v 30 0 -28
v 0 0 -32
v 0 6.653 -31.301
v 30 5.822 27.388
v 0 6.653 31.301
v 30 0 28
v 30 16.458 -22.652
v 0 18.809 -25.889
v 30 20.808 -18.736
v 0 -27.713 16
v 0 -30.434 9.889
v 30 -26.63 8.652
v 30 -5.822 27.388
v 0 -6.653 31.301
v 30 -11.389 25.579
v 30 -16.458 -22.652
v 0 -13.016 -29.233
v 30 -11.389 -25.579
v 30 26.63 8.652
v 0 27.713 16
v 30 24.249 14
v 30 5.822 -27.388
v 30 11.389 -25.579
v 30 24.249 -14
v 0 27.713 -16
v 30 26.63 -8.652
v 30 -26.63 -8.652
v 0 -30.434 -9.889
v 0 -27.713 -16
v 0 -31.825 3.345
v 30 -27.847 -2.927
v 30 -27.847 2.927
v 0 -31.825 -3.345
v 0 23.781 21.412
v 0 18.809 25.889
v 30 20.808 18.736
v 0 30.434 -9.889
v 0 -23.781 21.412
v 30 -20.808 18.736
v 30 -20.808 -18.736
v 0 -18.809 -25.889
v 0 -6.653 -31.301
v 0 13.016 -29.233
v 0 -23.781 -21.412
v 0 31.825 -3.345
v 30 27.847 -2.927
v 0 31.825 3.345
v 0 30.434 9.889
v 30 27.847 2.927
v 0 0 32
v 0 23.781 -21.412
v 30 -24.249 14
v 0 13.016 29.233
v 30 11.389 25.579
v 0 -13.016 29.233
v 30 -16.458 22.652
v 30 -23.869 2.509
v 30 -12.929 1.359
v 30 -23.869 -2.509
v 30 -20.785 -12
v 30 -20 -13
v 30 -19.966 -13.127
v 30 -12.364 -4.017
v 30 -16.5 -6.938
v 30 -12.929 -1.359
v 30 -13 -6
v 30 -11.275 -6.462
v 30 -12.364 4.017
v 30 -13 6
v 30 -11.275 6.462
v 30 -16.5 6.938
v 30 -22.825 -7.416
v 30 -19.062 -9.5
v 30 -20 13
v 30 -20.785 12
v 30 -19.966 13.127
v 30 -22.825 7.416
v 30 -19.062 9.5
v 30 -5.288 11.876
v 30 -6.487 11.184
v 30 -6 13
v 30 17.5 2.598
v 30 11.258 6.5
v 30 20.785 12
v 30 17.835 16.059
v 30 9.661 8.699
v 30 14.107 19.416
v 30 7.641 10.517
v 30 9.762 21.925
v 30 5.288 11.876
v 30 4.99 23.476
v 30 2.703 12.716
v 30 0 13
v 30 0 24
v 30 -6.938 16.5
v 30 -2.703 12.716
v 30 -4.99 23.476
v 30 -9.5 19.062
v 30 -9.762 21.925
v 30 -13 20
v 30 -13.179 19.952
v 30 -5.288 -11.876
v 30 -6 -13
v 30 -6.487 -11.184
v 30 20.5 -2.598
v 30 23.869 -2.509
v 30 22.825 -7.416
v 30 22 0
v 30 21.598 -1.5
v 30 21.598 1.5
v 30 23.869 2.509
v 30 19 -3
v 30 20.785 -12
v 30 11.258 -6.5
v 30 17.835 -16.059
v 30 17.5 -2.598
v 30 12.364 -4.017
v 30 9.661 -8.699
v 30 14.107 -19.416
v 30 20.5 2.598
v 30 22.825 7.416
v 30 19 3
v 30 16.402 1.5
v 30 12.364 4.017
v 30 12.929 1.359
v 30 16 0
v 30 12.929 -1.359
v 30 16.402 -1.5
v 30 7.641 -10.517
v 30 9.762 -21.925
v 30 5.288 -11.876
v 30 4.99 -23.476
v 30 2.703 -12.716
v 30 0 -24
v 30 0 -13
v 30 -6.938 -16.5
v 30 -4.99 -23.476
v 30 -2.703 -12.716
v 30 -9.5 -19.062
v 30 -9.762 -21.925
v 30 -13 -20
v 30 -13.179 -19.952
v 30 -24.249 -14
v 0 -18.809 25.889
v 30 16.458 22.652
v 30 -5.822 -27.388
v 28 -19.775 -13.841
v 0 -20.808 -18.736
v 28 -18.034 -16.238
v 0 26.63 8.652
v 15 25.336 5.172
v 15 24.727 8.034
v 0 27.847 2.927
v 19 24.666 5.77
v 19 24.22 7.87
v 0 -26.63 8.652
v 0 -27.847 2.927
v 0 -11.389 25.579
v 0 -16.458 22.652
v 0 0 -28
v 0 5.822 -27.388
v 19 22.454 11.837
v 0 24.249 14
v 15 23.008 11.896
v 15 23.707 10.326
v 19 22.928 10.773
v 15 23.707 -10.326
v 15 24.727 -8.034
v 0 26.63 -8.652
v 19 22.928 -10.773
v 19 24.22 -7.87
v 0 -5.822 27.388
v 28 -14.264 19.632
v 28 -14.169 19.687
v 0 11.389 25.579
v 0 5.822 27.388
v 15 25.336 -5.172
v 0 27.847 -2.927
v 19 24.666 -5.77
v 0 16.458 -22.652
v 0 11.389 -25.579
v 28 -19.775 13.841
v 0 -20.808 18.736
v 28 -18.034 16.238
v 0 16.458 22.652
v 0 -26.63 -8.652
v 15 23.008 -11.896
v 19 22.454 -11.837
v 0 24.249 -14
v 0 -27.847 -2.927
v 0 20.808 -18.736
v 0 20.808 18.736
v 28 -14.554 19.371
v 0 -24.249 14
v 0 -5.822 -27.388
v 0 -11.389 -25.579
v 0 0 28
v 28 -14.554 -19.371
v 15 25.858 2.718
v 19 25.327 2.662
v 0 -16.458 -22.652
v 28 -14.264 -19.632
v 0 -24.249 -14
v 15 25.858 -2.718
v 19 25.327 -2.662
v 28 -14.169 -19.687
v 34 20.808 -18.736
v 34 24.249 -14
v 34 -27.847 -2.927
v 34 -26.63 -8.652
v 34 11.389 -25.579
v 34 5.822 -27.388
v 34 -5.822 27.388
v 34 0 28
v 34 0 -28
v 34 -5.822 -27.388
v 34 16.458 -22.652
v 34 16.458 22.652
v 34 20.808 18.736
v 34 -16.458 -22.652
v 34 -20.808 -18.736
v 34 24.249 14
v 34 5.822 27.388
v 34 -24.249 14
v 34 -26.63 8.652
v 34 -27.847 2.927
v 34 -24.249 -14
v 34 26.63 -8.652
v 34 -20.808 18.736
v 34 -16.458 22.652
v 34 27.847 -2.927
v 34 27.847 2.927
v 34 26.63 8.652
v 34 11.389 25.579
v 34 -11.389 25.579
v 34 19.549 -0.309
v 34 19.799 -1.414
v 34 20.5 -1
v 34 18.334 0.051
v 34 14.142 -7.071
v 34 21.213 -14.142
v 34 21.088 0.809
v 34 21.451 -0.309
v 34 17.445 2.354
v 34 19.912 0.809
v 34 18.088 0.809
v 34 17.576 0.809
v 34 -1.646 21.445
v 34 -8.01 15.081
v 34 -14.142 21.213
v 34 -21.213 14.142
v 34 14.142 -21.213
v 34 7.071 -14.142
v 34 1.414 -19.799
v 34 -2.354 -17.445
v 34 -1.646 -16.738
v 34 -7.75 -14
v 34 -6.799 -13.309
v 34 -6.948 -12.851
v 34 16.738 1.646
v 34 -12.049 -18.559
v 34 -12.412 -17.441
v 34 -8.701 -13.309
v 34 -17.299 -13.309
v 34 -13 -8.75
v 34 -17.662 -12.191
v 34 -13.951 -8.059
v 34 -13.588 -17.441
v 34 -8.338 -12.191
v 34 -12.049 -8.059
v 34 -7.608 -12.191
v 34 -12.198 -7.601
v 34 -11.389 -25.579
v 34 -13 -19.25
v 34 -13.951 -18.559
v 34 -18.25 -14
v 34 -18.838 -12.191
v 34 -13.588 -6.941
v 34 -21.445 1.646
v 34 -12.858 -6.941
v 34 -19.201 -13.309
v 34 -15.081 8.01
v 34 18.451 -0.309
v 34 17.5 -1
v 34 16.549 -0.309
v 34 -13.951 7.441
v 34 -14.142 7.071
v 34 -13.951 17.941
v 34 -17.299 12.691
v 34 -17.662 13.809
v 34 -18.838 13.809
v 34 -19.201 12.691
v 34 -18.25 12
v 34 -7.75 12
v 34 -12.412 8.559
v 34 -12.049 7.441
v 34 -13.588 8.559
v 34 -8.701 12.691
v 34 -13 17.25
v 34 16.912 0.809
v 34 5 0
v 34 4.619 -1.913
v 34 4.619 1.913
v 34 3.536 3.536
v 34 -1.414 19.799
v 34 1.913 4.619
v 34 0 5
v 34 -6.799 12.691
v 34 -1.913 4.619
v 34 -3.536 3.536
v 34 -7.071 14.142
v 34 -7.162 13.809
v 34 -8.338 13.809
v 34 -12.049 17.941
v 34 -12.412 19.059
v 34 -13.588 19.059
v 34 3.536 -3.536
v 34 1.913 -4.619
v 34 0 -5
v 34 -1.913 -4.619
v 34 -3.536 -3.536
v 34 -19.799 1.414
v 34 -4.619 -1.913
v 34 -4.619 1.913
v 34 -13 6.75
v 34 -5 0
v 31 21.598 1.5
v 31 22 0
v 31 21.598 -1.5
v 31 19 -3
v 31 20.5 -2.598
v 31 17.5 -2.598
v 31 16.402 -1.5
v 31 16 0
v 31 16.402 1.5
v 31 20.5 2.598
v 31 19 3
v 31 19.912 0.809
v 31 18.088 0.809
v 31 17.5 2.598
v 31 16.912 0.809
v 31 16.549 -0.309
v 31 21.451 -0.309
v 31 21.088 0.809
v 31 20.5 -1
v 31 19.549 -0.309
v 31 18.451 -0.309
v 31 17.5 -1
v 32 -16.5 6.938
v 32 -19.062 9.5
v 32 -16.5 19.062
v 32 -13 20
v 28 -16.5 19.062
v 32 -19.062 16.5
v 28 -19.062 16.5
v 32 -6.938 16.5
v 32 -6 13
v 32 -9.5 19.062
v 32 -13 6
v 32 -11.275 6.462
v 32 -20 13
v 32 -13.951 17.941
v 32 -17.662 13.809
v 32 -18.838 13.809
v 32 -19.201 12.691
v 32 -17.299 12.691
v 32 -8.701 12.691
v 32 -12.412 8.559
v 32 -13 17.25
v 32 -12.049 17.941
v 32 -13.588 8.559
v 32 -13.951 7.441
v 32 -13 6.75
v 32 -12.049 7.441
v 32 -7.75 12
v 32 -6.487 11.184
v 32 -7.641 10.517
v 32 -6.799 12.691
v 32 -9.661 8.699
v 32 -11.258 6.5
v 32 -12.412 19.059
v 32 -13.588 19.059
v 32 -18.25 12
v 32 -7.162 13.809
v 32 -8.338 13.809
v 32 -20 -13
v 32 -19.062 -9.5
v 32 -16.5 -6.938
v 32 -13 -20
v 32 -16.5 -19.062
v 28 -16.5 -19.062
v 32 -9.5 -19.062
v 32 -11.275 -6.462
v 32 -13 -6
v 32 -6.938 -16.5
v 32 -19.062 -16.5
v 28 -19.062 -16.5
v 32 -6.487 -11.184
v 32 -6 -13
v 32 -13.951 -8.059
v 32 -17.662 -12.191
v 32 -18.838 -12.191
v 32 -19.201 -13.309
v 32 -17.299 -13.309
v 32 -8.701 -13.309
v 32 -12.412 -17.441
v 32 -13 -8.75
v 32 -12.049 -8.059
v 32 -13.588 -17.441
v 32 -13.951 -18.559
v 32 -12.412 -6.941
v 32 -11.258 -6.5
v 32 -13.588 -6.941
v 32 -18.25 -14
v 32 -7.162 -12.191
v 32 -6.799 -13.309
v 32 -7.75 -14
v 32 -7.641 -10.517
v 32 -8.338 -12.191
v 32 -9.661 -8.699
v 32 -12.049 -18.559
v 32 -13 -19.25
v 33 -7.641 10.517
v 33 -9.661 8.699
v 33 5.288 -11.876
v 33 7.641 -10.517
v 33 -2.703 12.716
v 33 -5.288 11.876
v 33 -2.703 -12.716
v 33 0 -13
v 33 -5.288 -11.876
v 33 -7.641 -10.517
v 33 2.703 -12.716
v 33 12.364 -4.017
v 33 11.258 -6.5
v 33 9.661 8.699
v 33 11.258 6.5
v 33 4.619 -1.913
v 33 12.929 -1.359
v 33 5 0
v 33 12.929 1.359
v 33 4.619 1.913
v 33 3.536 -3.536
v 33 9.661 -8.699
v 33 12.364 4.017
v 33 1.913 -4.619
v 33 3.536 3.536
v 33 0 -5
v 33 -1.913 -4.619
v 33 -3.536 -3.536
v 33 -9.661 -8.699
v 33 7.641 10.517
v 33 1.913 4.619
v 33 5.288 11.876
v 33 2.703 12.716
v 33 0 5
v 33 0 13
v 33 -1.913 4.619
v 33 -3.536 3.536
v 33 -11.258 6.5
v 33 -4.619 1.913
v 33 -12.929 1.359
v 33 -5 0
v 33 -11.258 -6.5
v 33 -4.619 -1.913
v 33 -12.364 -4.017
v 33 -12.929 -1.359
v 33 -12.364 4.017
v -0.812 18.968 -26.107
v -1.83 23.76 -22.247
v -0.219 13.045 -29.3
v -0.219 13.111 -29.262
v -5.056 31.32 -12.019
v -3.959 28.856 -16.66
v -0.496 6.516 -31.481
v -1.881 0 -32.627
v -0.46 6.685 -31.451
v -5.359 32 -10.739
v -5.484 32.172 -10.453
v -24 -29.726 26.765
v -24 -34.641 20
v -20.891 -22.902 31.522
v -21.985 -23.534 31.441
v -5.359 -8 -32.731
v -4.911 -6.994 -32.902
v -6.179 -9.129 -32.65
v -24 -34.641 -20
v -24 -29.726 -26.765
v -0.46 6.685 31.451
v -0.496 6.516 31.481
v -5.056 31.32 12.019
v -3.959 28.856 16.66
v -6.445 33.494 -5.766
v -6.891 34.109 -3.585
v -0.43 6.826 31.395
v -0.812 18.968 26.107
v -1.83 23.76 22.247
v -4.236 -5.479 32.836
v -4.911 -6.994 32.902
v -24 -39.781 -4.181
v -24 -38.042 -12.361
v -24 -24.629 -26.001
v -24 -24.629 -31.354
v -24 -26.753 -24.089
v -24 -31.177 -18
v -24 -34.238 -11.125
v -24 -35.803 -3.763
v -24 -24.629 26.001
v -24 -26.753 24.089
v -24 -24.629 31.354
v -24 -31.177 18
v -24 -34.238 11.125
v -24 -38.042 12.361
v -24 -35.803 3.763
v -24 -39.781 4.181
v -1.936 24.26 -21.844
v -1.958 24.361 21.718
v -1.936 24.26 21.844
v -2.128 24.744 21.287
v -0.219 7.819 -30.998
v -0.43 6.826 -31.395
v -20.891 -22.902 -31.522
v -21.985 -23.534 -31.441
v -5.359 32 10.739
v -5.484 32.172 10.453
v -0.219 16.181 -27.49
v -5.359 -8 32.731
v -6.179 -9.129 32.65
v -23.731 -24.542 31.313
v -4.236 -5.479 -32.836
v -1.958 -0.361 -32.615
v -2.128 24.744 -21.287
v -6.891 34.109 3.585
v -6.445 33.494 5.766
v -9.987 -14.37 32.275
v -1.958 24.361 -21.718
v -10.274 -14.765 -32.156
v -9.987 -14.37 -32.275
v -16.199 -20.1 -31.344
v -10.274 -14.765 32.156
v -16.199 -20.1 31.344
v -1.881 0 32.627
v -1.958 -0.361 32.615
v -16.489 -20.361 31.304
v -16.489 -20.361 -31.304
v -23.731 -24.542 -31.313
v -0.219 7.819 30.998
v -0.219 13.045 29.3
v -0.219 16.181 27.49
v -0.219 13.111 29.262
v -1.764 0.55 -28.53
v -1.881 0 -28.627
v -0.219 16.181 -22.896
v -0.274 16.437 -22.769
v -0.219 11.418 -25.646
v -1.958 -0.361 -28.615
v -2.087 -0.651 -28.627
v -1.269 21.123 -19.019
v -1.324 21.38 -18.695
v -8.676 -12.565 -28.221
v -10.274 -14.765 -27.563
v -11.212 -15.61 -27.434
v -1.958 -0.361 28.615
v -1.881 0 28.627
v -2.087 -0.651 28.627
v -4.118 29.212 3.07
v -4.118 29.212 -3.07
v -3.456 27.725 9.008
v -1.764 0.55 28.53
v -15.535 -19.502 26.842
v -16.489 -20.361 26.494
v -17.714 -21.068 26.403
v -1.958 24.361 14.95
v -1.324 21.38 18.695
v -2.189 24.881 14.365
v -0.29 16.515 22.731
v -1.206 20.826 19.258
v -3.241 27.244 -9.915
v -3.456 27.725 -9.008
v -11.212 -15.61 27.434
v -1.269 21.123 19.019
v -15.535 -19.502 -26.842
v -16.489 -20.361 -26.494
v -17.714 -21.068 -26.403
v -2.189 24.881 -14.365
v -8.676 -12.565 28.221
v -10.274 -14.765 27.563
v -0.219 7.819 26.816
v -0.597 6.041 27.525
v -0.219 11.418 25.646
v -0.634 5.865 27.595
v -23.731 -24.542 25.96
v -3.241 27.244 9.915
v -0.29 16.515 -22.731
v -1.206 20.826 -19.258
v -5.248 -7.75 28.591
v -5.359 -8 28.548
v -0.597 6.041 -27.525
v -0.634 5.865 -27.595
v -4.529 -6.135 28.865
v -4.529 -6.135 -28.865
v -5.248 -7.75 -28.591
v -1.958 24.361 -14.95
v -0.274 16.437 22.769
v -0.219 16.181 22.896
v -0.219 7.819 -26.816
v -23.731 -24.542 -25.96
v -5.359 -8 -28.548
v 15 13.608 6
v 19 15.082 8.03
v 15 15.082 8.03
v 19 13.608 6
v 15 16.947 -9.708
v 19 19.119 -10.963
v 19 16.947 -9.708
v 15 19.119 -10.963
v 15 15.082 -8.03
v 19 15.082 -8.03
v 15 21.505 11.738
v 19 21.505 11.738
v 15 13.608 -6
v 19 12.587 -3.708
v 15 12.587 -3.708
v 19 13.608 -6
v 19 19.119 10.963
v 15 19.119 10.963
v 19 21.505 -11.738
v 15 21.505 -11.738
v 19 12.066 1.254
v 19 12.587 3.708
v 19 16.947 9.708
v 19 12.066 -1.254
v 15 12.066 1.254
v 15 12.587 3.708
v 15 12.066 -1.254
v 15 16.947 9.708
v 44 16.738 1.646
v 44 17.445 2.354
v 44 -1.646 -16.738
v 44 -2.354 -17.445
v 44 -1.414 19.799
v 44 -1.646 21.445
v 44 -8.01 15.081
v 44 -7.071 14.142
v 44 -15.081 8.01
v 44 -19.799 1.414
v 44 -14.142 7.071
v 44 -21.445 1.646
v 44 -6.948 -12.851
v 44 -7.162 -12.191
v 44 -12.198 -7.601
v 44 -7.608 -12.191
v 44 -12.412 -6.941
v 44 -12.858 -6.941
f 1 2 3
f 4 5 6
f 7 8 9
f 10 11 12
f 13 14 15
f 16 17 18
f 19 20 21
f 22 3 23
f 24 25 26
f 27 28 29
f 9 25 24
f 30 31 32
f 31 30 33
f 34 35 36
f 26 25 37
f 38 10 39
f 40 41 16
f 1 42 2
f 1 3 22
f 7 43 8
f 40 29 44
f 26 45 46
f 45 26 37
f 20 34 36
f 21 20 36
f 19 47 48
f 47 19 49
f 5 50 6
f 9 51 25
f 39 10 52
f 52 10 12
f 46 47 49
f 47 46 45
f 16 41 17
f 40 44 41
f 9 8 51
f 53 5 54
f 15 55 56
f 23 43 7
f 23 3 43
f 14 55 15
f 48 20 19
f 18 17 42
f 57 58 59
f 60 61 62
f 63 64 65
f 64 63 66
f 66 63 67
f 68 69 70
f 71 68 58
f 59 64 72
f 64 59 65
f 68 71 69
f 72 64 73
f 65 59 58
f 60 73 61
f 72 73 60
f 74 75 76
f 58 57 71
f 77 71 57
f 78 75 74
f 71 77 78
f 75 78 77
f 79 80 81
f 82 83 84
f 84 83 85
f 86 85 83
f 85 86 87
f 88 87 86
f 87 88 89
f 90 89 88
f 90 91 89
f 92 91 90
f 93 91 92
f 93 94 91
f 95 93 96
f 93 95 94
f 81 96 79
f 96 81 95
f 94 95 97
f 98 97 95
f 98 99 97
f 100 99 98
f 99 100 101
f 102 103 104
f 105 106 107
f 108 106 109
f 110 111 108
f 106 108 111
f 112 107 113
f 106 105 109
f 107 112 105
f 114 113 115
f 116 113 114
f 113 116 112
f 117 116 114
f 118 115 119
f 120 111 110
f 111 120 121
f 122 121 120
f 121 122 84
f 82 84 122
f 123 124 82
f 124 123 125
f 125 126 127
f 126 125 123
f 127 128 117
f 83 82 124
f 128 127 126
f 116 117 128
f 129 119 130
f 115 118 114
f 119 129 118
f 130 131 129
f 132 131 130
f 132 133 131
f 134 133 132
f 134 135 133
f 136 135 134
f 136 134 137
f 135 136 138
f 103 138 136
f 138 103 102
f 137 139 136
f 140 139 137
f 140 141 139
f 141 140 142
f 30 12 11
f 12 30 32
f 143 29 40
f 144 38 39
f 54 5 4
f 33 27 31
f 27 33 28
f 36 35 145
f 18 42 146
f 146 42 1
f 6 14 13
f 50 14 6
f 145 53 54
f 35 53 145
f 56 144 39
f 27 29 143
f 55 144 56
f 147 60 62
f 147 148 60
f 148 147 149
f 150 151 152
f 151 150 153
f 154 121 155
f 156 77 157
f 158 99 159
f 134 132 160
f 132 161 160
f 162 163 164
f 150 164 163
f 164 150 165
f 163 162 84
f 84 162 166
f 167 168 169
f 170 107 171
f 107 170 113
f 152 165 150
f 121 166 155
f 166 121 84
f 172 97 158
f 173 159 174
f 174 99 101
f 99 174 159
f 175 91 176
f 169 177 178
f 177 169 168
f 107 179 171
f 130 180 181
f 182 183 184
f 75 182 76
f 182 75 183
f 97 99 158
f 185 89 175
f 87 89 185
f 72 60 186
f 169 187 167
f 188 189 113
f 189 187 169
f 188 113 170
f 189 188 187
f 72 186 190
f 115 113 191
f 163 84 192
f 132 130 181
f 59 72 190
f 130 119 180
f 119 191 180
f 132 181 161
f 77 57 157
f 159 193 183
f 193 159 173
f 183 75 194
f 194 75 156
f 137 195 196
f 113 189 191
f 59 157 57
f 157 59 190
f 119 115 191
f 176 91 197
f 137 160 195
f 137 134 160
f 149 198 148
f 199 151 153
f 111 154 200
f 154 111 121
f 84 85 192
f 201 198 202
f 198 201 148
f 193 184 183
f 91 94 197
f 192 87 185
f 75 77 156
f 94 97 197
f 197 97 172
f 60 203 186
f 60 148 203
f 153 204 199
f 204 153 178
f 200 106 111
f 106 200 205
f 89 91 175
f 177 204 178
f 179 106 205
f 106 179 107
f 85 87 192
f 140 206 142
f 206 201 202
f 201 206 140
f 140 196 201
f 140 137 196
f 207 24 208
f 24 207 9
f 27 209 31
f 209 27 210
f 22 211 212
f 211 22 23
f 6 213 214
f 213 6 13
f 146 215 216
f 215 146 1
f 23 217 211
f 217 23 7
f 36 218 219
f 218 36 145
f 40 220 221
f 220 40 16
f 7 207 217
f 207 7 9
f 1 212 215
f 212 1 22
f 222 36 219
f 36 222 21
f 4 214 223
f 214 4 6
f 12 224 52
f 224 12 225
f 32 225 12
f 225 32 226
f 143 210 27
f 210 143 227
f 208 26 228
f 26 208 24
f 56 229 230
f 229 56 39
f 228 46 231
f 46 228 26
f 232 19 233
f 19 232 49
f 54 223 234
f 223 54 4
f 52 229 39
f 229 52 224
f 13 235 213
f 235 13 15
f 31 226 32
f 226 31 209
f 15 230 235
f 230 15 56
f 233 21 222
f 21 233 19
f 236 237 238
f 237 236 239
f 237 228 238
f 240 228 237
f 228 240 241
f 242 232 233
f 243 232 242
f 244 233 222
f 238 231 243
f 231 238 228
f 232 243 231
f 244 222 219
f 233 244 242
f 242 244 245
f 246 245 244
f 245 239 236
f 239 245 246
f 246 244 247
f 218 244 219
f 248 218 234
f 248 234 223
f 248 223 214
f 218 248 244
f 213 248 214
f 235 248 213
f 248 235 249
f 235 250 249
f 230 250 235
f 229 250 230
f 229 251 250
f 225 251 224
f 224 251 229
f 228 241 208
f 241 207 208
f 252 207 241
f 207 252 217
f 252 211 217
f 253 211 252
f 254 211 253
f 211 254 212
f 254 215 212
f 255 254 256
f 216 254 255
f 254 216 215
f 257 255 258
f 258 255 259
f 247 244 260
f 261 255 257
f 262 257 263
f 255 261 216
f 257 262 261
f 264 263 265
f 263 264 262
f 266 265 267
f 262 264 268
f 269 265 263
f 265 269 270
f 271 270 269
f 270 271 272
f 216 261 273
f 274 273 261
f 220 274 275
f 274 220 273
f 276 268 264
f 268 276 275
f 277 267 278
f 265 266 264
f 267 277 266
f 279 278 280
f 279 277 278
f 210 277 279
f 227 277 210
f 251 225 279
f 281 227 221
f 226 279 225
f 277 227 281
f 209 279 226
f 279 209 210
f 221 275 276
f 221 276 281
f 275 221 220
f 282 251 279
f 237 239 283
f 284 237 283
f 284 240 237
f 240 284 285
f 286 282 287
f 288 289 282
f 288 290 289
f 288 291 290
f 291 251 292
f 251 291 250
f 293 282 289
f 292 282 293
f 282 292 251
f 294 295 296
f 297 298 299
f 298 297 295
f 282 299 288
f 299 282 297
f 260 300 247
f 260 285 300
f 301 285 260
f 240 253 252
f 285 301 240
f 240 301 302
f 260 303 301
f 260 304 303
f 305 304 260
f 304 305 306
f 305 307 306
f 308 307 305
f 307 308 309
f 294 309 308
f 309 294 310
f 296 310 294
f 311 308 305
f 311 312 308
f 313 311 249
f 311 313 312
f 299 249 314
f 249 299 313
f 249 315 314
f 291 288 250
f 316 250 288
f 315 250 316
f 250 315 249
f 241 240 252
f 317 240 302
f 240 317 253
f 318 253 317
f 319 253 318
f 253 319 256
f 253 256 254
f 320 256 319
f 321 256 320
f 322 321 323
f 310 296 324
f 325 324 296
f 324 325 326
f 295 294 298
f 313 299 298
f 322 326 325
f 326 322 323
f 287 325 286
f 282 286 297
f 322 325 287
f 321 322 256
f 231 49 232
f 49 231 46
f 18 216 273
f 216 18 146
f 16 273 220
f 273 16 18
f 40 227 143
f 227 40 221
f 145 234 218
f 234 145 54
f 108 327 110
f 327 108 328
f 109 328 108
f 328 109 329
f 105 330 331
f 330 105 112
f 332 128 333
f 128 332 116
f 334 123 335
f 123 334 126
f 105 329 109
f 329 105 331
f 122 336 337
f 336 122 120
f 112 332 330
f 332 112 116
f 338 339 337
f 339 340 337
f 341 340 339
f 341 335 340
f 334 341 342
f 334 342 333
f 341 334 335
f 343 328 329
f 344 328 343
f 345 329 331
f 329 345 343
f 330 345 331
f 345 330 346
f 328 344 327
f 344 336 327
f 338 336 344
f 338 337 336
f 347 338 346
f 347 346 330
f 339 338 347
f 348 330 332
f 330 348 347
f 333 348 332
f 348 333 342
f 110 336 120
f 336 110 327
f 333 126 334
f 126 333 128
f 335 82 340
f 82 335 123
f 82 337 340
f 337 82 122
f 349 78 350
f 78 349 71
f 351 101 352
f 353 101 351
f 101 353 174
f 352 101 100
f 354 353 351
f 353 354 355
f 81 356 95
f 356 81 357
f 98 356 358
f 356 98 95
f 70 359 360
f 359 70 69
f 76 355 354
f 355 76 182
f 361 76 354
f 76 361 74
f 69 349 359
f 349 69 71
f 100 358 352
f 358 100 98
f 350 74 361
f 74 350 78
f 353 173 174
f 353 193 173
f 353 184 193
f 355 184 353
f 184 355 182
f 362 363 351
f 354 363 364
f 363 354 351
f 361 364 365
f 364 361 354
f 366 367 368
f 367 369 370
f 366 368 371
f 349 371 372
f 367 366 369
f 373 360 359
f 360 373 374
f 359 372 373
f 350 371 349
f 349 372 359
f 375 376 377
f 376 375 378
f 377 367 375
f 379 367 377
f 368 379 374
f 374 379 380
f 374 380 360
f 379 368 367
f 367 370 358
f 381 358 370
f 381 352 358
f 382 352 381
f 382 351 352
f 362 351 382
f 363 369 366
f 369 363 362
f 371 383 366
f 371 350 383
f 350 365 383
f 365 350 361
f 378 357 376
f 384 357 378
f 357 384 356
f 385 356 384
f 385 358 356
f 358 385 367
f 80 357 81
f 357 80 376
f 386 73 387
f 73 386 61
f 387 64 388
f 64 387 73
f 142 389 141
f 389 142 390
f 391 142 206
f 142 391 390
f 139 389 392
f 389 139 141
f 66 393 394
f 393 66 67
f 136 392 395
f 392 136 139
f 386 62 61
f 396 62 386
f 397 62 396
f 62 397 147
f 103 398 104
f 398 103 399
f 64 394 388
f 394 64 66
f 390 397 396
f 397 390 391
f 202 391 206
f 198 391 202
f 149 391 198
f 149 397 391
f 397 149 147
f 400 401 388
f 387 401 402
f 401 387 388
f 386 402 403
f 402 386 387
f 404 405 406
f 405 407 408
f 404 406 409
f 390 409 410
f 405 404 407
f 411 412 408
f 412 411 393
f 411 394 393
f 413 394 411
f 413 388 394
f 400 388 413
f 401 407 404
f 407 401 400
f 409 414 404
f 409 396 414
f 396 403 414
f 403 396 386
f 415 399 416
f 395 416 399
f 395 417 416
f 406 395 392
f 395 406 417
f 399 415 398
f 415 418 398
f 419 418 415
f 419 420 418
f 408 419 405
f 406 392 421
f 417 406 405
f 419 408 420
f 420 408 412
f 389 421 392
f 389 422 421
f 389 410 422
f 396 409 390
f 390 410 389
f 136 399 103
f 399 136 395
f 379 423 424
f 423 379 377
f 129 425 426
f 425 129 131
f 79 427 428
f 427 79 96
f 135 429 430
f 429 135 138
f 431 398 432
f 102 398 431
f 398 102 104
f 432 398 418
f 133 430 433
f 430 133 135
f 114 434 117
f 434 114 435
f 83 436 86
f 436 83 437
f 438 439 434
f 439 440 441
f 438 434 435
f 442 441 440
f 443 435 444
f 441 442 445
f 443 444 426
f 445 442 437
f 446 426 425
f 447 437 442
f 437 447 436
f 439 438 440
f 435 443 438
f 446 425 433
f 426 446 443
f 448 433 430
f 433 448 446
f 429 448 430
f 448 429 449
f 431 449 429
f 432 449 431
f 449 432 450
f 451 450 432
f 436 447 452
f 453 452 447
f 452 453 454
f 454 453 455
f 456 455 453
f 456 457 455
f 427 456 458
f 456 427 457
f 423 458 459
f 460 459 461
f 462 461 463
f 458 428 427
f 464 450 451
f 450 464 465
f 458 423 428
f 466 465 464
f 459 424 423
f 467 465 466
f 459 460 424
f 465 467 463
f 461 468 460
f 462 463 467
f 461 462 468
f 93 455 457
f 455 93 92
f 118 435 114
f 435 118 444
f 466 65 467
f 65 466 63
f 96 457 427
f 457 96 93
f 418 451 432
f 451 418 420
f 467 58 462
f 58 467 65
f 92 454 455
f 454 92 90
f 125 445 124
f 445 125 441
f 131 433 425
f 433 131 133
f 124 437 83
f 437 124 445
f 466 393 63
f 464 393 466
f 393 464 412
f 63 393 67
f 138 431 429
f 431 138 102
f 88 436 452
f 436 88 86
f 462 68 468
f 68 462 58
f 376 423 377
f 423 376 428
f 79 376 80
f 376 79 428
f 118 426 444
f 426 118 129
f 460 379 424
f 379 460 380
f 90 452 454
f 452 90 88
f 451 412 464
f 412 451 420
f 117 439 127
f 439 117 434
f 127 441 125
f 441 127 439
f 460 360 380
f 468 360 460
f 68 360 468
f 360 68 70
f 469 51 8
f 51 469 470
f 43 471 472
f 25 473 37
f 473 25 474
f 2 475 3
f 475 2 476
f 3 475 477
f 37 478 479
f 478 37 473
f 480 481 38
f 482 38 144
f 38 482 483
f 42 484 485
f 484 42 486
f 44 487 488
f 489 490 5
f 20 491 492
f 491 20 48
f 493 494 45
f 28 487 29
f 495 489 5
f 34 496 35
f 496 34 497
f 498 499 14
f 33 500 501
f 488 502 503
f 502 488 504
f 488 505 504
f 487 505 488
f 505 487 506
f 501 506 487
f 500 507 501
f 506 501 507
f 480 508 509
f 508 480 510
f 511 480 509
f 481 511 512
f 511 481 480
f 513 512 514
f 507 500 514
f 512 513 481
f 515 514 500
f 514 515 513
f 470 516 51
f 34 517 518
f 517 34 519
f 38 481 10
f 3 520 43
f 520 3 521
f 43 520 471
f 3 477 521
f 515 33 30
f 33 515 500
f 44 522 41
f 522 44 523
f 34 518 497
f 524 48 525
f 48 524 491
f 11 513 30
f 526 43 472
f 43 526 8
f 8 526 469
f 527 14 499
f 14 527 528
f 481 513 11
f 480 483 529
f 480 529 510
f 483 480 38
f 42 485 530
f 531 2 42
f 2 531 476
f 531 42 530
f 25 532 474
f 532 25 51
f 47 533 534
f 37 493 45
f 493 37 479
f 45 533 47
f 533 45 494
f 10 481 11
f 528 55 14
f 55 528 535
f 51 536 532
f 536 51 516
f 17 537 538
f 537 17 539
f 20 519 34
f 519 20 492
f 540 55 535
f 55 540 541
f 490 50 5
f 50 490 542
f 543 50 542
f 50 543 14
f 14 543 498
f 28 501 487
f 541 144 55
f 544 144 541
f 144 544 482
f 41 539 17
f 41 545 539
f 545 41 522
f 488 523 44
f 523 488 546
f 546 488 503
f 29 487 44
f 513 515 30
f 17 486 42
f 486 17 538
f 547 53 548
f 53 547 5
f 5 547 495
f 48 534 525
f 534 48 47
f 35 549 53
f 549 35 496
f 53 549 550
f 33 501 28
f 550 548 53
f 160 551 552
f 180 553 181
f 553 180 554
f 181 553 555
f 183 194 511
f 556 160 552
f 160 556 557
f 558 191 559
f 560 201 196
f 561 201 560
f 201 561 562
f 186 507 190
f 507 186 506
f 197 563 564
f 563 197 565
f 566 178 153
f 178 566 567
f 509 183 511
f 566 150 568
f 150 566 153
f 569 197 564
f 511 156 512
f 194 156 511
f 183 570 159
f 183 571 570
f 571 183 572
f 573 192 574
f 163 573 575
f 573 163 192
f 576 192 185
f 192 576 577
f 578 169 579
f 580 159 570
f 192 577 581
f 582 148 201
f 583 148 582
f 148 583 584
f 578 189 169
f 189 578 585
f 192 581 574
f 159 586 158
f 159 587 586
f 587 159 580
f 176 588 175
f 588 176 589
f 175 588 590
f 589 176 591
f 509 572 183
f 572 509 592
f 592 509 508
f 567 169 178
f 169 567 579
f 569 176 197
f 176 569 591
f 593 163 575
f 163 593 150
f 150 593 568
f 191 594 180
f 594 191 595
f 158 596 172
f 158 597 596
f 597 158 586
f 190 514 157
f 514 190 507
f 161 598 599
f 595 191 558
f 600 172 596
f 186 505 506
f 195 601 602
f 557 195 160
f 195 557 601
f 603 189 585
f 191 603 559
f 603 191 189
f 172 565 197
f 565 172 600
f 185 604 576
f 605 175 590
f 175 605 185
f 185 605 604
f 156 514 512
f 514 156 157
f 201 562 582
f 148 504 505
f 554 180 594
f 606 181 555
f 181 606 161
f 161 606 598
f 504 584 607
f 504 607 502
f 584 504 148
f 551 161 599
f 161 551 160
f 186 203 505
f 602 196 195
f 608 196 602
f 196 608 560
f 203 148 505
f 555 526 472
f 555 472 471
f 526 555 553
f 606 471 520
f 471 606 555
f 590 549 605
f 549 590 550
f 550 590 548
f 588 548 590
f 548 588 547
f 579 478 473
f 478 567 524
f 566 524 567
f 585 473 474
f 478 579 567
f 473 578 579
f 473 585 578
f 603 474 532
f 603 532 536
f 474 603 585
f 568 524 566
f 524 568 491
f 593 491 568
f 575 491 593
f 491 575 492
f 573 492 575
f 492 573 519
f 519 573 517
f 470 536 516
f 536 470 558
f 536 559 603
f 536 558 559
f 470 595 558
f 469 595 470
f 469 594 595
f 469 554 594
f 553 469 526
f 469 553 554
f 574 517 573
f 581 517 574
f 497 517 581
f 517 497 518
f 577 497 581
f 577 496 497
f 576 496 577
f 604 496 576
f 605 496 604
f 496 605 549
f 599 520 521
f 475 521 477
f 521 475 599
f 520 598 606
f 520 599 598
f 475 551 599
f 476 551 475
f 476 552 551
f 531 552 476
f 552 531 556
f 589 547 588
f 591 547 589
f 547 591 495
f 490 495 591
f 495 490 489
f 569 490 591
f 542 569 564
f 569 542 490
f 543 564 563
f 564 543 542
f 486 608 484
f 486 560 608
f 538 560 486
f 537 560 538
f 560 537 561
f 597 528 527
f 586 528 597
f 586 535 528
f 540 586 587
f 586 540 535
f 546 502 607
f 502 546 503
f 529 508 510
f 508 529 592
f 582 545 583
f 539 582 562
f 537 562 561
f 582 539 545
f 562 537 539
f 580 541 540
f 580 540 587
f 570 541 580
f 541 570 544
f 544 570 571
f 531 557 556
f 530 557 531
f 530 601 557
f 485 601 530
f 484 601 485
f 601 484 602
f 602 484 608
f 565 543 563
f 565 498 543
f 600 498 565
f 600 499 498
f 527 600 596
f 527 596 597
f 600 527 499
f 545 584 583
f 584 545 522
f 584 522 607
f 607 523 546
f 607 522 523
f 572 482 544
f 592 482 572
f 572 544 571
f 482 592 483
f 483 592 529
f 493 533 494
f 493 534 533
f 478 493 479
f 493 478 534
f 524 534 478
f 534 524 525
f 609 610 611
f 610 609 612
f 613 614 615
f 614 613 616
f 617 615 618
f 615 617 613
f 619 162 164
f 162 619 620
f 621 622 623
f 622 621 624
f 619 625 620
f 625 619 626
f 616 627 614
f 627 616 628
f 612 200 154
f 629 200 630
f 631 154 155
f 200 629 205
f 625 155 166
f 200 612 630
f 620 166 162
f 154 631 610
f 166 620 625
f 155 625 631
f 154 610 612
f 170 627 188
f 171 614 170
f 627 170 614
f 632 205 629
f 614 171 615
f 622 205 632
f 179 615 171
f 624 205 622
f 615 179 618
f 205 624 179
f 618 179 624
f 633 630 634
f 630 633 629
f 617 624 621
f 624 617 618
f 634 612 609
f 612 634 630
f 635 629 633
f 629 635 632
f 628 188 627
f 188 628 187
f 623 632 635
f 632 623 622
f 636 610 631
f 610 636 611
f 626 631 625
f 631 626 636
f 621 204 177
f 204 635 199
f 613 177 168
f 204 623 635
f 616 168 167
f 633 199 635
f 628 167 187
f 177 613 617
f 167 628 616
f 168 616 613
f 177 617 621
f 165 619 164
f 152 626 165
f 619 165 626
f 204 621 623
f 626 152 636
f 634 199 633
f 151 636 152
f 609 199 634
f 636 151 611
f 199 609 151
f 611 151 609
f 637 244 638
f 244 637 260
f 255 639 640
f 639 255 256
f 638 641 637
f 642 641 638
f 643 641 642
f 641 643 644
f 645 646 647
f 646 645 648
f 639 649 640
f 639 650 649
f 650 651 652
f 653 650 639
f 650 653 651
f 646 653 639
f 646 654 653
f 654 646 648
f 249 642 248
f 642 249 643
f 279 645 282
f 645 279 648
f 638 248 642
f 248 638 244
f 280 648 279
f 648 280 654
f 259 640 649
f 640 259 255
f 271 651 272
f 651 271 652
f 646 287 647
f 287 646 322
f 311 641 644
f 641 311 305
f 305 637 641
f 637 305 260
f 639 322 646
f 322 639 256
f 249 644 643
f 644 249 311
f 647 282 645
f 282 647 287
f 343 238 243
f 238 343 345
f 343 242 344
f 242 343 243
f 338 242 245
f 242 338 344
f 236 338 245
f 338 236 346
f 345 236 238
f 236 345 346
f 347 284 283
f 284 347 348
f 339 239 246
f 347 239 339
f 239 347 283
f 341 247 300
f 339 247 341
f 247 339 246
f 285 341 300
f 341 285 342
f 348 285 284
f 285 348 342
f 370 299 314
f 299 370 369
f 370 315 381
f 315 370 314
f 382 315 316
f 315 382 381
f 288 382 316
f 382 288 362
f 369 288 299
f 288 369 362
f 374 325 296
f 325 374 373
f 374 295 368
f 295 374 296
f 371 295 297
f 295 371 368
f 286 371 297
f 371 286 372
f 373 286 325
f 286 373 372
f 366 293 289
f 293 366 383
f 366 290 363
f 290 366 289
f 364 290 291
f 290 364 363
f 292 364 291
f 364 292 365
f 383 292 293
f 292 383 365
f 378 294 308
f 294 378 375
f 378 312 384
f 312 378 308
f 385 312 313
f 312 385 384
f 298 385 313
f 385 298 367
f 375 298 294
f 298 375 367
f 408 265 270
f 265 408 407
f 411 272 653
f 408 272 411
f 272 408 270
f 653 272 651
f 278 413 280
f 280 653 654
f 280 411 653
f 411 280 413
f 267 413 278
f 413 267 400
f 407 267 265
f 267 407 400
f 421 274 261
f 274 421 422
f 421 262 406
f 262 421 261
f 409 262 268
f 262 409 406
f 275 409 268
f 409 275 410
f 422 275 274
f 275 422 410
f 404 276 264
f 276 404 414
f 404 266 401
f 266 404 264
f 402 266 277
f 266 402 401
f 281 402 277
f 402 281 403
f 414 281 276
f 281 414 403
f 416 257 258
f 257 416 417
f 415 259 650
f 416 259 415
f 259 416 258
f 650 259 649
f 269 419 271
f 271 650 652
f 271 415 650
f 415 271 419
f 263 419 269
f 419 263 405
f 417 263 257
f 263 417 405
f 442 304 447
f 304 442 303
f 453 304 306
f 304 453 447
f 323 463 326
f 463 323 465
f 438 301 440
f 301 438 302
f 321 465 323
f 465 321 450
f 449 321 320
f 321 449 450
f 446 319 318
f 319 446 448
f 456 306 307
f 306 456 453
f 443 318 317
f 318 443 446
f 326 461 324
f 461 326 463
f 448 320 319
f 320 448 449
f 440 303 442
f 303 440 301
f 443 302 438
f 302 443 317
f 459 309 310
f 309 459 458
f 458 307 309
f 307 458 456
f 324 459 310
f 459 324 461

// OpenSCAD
//goggles
//union(){}
//intersection(){
//cylinder(height, r1, r2, center=true/false)
//cube()

//focal cone
tip_radius = 28;
tip_thickness = 4;
centre_radius = 32;
wall_thickness = 4;
tip_length = 30; //akin to distance between eye and mounted lens

//eyepiece size
eyepiece_length = 24;
eyepiece_end_radius = 40;

//eyepiece shape
cut_cylinder_radius = 40;
cut_offset = 12;

//lens
seating_depth = 5;
lens_radius = 13;

//led size
led_radius = 3;
led_inset = 3;
pin_width = 1;

//neopixel size
neopixel_radius = 7;
neopixel_inset = 4;
neopixel_location = 13;

//camera aperture
aperture_radius = 5;

//rpi camera mount
cube_size = 27;
mount_height = 10;
mount_wall_thickness = 1;

//LED diffuser
diffuser_height = 15;
diffuser_radius = 12;

upper_diameter = 0.13*(diffuser_height+tip_thickness+1)+tip_radius-1;
lower_diameter = 0.13*diffuser_height+tip_radius-1;

difference(){
union(){ //adds pegs for rpi camera mount

union(){

difference(){

union(){
//end disk
translate([tip_length,0,0]) rotate([90,90,90]) cylinder(tip_thickness,tip_radius,tip_radius);

//focal tip
difference(){
//subtract one cone from another for hollow cylinder
translate([0,0,0]) rotate([90,90,90]) cylinder(tip_length,centre_radius,tip_radius);
translate([0,0,0]) rotate([90,90,90]) cylinder(tip_length,centre_radius-wall_thickness,tip_radius-wall_thickness);
}
}

//LED  inset
translate([tip_length-tip_thickness/2,tip_radius-1.5*wall_thickness-led_radius,0]) rotate([90,90,90]) cylinder(led_inset,led_radius,led_radius,$fn = 12);

//neopixel insets
translate([tip_length-tip_thickness/2,-neopixel_location,neopixel_location]) rotate([90,90,90]) cylinder(neopixel_inset,neopixel_radius,neopixel_radius,$fn = 12);
translate([tip_length-tip_thickness/2,-neopixel_location,-neopixel_location]) rotate([90,90,90]) cylinder(neopixel_inset,neopixel_radius,neopixel_radius,$fn = 12);

//lens inset
translate([tip_length-tip_thickness/2,0,0]) rotate([90,90,90]) cylinder(seating_depth,lens_radius,lens_radius);
}


//eyepiece
difference(){
//makes hollow cone cylinder as base eyepiece
difference(){
translate([-eyepiece_length,0,0]) rotate([90,90,90]) cylinder(eyepiece_length,eyepiece_end_radius,centre_radius);
translate([-eyepiece_length,0,0]) rotate([90,90,90]) cylinder(eyepiece_length,eyepiece_end_radius-wall_thickness,centre_radius-wall_thickness);
}
//controls shape of eyepiece
//vertical cylinder cut
translate([-cut_cylinder_radius,cut_offset,-cut_cylinder_radius]) rotate([0,0,90]) cylinder(80,cut_cylinder_radius,cut_cylinder_radius);
//sphere cut
//translate([-20,2,0]) sphere(22);
//cylinder cut
//translate([-20,2,0]) rotate([97,90,90]) cylinder(20,28,14);
}

}//closes eyepiece tip base union

//rpi camera mount
translate([tip_length+mount_height-tip_thickness/2+1,-2,2]) rotate([90,45,90]) cube(size = [cube_size, cube_size+1, mount_height], center = true);

//LED diffuser
difference(){
translate([tip_length-diffuser_height,tip_radius-wall_thickness,0]) rotate([90,90,90]) cylinder(tip_thickness,diffuser_radius,diffuser_radius);
//subtraction ring
difference(){
translate([tip_length-diffuser_height-1,0,0]) rotate([90,90,90]) cylinder(tip_thickness+2,2*centre_radius,2*centre_radius);
translate([tip_length-diffuser_height-1,0,0]) rotate([90,90,90]) cylinder(tip_thickness+2,upper_diameter,lower_diameter);
}
}

}//closes goggle mount union

//Rpi mounting bracket
//subtracts centre of mounting block
translate([tip_length+mount_height+1-tip_thickness/2+1,0,0]) rotate([90,45,90]) cube(size = [cube_size+3, cube_size-1, 1.2*mount_height], center = true);
//removes secondary block for neopixel pins
translate([tip_length+mount_height+1-tip_thickness/2+1,0,0]) rotate([90,45,90]) cube(size = [50, 10, 1.2*mount_height], center = true);


//LED pin holes
translate([tip_length-tip_thickness/2,tip_radius-1.5*wall_thickness-led_radius*0.5,0]) rotate([90,90,90]) cylinder(10,pin_width,pin_width);
translate([tip_length-tip_thickness/2,tip_radius-1.5*wall_thickness-led_radius*1.5,0]) rotate([90,90,90]) cylinder(10,pin_width,pin_width);

//neopixel pin holes
//Top
translate([tip_length-tip_thickness/2,-neopixel_location,neopixel_location+0.75*neopixel_radius]) rotate([90,90,90]) cylinder(20,pin_width,pin_width);
//Bottom
translate([tip_length-tip_thickness/2,-neopixel_location,neopixel_location-0.75*neopixel_radius]) rotate([90,90,90]) cylinder(20,pin_width,pin_width);
//Left
translate([tip_length-tip_thickness/2,-neopixel_location-0.75*neopixel_radius,neopixel_location]) rotate([90,90,90]) cylinder(20,pin_width,pin_width);
//Right
translate([tip_length-tip_thickness/2,-neopixel_location+0.75*neopixel_radius,neopixel_location]) rotate([90,90,90]) cylinder(20,pin_width,pin_width);


//Top
translate([tip_length-tip_thickness/2,-neopixel_location,-neopixel_location+0.75*neopixel_radius]) rotate([90,90,90]) cylinder(20,pin_width,pin_width);
//Bottom
translate([tip_length-tip_thickness/2,-neopixel_location,-neopixel_location-0.75*neopixel_radius]) rotate([90,90,90]) cylinder(20,pin_width,pin_width);
//Left
translate([tip_length-tip_thickness/2,-neopixel_location-0.75*neopixel_radius,-neopixel_location]) rotate([90,90,90]) cylinder(20,pin_width,pin_width);
//Right
translate([tip_length-tip_thickness/2,-neopixel_location+0.75*neopixel_radius,-neopixel_location]) rotate([90,90,90]) cylinder(20,pin_width,pin_width);

//camera aperture
translate([tip_length-tip_thickness/2,0,0]) rotate([90,90,90]) cylinder(10,aperture_radius,aperture_radius);

}
